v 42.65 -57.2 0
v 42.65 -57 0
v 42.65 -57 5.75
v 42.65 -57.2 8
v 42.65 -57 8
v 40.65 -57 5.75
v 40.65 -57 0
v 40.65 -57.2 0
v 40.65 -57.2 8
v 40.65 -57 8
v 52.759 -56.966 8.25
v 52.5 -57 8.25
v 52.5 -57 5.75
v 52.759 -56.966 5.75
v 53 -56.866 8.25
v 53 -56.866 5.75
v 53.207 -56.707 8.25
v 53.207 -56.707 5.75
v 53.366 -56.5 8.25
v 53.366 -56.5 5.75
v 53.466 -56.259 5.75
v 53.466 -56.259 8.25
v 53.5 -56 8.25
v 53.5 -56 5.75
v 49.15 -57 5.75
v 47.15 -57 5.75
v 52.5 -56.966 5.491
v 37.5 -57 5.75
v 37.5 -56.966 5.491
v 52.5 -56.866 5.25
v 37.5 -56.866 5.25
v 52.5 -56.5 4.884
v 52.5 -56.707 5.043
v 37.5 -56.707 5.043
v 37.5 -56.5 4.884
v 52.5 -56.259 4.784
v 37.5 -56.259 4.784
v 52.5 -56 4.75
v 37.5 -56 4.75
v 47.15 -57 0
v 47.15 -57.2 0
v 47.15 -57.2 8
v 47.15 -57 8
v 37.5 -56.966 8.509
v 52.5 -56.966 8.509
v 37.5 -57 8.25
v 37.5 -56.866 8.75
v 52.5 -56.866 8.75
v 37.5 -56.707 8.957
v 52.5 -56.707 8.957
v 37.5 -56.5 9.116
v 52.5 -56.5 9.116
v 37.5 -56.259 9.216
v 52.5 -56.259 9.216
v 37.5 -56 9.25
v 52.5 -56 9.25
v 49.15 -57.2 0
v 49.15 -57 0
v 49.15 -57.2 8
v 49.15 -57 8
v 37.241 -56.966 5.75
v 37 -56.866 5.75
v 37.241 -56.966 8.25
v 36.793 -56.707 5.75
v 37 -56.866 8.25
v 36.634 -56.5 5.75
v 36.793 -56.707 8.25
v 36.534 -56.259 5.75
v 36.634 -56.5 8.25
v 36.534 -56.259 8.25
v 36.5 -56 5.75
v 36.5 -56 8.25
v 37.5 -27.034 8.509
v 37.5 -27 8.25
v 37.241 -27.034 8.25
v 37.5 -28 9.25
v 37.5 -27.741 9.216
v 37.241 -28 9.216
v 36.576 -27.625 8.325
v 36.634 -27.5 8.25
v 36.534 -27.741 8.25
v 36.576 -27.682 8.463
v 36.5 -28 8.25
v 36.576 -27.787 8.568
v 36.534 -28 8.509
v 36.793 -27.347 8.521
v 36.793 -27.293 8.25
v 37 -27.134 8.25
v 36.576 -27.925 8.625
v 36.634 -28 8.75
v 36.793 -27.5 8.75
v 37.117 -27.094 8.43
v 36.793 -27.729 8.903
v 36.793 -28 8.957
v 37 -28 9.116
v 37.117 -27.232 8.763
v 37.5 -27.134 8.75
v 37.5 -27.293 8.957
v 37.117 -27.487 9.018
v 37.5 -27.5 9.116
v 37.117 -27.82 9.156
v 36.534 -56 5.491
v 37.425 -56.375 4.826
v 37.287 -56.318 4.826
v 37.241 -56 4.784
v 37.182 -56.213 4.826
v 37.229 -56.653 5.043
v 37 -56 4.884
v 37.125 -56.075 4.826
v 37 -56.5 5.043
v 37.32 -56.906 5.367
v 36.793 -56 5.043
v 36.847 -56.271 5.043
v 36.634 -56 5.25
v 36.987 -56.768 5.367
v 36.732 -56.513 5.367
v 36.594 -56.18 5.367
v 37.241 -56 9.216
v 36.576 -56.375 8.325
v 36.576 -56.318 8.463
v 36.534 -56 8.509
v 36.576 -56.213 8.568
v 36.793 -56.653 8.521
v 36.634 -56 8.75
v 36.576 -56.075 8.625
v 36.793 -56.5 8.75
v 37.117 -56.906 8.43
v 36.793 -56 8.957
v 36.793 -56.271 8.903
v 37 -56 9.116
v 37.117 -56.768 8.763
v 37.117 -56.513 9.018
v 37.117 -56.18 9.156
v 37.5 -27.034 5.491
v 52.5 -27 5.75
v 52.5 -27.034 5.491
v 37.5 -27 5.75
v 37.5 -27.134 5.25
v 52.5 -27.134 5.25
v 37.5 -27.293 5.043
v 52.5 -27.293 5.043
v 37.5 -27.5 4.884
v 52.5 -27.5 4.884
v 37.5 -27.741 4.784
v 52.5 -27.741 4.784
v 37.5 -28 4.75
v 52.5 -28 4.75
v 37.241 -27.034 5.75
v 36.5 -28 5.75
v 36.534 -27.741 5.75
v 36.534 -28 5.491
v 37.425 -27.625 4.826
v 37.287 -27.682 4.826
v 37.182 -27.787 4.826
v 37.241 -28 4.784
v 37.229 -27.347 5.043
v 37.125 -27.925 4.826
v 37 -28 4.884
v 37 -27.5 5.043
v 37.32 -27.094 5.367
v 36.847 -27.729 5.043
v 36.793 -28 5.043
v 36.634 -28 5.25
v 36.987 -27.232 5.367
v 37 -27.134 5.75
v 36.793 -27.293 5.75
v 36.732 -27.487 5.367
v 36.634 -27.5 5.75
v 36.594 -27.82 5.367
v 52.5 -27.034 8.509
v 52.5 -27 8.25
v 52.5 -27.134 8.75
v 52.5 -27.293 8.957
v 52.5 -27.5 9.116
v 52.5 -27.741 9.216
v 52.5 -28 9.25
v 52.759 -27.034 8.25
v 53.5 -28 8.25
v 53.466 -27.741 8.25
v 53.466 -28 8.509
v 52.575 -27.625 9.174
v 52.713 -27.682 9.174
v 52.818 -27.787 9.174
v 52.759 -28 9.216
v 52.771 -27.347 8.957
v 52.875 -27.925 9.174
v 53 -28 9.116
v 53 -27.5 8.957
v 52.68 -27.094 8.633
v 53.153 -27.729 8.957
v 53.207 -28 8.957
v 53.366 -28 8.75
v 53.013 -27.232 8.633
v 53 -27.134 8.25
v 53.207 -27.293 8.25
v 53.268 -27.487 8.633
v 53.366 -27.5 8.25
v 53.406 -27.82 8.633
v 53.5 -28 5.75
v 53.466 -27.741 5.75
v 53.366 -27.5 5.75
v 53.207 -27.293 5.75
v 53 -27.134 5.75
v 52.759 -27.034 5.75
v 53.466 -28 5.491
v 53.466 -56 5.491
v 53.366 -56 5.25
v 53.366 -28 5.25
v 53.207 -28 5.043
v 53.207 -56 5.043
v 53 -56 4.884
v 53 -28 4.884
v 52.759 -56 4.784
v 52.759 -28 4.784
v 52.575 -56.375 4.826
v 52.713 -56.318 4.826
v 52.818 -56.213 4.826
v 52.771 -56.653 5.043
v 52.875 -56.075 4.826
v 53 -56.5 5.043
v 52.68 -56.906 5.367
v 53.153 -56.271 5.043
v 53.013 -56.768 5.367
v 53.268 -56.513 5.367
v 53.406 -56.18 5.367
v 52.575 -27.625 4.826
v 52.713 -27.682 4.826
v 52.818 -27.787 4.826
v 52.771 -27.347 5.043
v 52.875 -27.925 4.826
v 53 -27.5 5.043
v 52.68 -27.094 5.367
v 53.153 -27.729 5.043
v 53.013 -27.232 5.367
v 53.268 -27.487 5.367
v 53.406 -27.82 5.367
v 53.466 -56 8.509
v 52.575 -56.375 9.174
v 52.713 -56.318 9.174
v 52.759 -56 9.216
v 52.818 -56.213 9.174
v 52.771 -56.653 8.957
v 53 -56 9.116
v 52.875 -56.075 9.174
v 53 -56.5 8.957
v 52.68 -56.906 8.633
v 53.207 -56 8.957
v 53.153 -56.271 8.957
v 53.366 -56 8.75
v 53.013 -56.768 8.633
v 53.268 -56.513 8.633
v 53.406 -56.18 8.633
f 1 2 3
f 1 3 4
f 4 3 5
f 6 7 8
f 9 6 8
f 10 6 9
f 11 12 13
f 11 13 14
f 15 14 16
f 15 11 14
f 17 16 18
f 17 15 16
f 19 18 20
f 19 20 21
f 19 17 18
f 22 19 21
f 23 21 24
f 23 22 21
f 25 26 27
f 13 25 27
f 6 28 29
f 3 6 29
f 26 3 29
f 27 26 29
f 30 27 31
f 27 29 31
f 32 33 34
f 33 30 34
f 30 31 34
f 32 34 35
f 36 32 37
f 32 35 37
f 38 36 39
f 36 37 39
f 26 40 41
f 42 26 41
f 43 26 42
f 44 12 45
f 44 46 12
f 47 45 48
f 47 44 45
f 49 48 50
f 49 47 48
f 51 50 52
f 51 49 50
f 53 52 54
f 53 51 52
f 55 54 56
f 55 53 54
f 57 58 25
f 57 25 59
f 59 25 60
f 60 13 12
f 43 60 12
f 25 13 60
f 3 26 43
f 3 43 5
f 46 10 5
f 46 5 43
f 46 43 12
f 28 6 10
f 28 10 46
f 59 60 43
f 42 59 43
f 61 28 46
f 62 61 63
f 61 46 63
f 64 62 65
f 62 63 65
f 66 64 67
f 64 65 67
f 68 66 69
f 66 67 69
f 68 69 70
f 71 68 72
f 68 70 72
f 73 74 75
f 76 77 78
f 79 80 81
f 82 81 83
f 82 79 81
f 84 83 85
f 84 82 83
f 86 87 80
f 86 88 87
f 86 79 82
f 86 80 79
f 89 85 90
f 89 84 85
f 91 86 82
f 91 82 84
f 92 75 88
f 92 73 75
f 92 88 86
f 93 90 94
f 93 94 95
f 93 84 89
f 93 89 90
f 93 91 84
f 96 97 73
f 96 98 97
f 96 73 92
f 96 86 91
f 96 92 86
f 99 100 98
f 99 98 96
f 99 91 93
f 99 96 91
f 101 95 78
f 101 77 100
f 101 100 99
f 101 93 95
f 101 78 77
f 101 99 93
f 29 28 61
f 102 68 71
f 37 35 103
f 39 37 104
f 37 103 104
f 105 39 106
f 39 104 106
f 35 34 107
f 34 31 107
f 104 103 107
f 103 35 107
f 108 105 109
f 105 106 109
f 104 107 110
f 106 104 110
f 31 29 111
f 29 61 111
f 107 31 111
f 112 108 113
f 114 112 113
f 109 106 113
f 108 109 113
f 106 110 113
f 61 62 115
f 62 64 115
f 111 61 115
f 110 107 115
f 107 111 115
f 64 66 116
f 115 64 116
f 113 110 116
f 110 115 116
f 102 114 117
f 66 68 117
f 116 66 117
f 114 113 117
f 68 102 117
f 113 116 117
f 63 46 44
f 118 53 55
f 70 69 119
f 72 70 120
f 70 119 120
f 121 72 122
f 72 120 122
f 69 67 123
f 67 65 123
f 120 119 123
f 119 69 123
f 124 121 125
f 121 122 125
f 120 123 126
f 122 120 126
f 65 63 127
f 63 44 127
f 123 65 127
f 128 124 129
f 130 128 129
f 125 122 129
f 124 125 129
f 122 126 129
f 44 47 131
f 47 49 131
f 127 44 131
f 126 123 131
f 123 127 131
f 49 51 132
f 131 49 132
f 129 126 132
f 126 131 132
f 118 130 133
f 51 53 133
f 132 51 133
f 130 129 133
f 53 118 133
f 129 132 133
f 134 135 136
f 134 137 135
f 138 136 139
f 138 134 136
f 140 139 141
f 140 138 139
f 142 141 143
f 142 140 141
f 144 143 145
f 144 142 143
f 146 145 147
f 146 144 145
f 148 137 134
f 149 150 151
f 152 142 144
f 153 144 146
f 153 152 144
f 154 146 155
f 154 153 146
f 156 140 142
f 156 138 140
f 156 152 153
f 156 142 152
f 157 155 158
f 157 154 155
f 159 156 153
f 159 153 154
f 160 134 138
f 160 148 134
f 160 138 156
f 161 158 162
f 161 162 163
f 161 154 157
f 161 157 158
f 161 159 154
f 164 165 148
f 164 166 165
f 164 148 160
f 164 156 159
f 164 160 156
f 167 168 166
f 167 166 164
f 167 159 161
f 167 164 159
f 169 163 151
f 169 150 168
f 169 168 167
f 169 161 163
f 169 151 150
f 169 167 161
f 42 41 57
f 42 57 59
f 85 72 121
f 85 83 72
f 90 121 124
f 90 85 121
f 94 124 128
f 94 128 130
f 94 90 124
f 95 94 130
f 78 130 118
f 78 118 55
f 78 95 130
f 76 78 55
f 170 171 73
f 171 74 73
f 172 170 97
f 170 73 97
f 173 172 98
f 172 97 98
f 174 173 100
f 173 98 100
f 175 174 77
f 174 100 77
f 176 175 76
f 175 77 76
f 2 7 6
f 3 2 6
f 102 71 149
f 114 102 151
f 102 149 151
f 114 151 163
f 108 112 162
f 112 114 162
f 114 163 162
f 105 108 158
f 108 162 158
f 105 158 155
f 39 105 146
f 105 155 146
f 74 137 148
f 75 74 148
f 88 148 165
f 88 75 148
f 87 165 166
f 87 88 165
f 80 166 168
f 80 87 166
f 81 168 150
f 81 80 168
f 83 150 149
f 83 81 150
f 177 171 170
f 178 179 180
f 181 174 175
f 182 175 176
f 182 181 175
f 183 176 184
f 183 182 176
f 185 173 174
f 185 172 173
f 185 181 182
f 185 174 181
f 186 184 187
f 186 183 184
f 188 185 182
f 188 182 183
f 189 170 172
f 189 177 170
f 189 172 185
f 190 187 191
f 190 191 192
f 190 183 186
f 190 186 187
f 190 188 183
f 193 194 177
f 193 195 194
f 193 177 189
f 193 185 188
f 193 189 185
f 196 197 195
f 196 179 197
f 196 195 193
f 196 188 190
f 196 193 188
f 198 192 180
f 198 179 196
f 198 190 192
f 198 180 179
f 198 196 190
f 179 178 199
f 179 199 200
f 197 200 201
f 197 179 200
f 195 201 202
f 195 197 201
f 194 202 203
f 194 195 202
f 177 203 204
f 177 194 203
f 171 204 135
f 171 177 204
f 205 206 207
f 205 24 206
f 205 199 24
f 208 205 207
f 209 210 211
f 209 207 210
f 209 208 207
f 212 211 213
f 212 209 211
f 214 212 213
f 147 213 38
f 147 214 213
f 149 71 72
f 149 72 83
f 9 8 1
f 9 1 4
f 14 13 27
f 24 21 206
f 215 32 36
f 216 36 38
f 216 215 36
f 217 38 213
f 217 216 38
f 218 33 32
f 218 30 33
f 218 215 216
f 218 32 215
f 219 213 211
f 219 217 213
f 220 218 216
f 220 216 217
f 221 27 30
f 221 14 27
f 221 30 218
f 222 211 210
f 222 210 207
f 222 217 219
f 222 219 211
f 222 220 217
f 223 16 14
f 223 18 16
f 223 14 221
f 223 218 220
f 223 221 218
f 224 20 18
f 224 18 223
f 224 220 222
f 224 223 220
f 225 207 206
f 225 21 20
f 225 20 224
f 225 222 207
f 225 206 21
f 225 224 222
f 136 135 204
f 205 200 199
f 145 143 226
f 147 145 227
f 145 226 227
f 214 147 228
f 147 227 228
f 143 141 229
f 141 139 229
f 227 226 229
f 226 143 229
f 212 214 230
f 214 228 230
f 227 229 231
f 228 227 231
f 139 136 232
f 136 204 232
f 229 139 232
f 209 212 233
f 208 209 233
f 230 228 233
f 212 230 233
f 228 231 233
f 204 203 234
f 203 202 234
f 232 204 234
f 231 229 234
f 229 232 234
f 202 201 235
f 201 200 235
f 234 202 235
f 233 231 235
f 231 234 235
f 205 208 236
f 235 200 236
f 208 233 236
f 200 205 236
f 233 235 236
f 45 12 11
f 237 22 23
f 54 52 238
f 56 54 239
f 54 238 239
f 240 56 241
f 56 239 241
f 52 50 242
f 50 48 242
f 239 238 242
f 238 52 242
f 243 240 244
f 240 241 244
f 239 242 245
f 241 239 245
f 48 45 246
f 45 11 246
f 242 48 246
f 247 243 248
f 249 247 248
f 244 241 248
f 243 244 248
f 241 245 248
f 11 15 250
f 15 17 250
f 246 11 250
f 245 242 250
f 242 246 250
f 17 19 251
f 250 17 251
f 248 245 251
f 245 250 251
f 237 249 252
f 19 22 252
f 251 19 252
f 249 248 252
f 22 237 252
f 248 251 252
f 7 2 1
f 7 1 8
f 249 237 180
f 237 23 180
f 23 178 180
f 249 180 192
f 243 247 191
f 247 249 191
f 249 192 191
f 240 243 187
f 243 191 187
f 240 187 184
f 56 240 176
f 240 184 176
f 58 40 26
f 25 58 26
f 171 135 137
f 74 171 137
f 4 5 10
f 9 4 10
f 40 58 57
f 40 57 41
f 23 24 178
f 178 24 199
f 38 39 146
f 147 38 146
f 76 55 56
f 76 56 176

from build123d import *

# Parameters (mm, degrees)
BOX002_W            = 8
BOX002_H            = 2
BOX002_DEPTH        = 0.2
BOX001_W            = 8
BOX001_H            = 2
BOX001_DEPTH        = 0.2
BOX_W               = 30
BOX_H               = 17
BOX_DEPTH           = 4.5
BOX_PLACEMENT_ANGLE = 90
FILLET_R            = 1


with BuildPart() as box002:
    # Box002 → Box002 (new body)
    with BuildSketch(Plane(origin=(49.15, -57, 0), x_dir=(0, 0, 1), z_dir=(0, -1, 0))):
        with Locations((4, 1)):
            Rectangle(BOX002_W, BOX002_H)
    extrude(amount=BOX002_DEPTH)


with BuildPart() as box001:
    # Box001 → Box001 (new body)
    with BuildSketch(Plane(origin=(42.65, -57, 0), x_dir=(0, 0, 1), z_dir=(0, -1, 0))):
        with Locations((4, 1)):
            Rectangle(BOX001_W, BOX001_H)
    extrude(amount=BOX001_DEPTH)


with BuildPart() as battery:
    # Box → Box (new body)
    with BuildSketch(Plane.XY):
        with Locations((15, 8.5)):
            Rectangle(BOX_W, BOX_H)
    extrude(amount=BOX_DEPTH)


with BuildPart() as battery_1:
    # Box placement: moved
    add(battery.part.moved(Location((53.5, -57, 4.75))).rotate(Axis((53.5, -57, 4.75), (0, 0, 1)), BOX_PLACEMENT_ANGLE))

    # Fillet
    fillet_edges = [battery_1.edges().sort_by_distance(p)[0] for p in [
        (53.5, -57, 7),
        (45, -57, 9.25),
        (36.5, -57, 7),
        (45, -57, 4.75),
        (53.5, -27, 7),
        (45, -27, 9.25),
        (36.5, -27, 7),
        (45, -27, 4.75),
        (53.5, -42, 4.75),
        (53.5, -42, 9.25),
        (36.5, -42, 4.75),
        (36.5, -42, 9.25),
    ]]
    fillet(fillet_edges, radius=FILLET_R)

    # Fusion: union Box002, Box001
    add(box002.part)
    add(box001.part)


solid = battery_1.part
